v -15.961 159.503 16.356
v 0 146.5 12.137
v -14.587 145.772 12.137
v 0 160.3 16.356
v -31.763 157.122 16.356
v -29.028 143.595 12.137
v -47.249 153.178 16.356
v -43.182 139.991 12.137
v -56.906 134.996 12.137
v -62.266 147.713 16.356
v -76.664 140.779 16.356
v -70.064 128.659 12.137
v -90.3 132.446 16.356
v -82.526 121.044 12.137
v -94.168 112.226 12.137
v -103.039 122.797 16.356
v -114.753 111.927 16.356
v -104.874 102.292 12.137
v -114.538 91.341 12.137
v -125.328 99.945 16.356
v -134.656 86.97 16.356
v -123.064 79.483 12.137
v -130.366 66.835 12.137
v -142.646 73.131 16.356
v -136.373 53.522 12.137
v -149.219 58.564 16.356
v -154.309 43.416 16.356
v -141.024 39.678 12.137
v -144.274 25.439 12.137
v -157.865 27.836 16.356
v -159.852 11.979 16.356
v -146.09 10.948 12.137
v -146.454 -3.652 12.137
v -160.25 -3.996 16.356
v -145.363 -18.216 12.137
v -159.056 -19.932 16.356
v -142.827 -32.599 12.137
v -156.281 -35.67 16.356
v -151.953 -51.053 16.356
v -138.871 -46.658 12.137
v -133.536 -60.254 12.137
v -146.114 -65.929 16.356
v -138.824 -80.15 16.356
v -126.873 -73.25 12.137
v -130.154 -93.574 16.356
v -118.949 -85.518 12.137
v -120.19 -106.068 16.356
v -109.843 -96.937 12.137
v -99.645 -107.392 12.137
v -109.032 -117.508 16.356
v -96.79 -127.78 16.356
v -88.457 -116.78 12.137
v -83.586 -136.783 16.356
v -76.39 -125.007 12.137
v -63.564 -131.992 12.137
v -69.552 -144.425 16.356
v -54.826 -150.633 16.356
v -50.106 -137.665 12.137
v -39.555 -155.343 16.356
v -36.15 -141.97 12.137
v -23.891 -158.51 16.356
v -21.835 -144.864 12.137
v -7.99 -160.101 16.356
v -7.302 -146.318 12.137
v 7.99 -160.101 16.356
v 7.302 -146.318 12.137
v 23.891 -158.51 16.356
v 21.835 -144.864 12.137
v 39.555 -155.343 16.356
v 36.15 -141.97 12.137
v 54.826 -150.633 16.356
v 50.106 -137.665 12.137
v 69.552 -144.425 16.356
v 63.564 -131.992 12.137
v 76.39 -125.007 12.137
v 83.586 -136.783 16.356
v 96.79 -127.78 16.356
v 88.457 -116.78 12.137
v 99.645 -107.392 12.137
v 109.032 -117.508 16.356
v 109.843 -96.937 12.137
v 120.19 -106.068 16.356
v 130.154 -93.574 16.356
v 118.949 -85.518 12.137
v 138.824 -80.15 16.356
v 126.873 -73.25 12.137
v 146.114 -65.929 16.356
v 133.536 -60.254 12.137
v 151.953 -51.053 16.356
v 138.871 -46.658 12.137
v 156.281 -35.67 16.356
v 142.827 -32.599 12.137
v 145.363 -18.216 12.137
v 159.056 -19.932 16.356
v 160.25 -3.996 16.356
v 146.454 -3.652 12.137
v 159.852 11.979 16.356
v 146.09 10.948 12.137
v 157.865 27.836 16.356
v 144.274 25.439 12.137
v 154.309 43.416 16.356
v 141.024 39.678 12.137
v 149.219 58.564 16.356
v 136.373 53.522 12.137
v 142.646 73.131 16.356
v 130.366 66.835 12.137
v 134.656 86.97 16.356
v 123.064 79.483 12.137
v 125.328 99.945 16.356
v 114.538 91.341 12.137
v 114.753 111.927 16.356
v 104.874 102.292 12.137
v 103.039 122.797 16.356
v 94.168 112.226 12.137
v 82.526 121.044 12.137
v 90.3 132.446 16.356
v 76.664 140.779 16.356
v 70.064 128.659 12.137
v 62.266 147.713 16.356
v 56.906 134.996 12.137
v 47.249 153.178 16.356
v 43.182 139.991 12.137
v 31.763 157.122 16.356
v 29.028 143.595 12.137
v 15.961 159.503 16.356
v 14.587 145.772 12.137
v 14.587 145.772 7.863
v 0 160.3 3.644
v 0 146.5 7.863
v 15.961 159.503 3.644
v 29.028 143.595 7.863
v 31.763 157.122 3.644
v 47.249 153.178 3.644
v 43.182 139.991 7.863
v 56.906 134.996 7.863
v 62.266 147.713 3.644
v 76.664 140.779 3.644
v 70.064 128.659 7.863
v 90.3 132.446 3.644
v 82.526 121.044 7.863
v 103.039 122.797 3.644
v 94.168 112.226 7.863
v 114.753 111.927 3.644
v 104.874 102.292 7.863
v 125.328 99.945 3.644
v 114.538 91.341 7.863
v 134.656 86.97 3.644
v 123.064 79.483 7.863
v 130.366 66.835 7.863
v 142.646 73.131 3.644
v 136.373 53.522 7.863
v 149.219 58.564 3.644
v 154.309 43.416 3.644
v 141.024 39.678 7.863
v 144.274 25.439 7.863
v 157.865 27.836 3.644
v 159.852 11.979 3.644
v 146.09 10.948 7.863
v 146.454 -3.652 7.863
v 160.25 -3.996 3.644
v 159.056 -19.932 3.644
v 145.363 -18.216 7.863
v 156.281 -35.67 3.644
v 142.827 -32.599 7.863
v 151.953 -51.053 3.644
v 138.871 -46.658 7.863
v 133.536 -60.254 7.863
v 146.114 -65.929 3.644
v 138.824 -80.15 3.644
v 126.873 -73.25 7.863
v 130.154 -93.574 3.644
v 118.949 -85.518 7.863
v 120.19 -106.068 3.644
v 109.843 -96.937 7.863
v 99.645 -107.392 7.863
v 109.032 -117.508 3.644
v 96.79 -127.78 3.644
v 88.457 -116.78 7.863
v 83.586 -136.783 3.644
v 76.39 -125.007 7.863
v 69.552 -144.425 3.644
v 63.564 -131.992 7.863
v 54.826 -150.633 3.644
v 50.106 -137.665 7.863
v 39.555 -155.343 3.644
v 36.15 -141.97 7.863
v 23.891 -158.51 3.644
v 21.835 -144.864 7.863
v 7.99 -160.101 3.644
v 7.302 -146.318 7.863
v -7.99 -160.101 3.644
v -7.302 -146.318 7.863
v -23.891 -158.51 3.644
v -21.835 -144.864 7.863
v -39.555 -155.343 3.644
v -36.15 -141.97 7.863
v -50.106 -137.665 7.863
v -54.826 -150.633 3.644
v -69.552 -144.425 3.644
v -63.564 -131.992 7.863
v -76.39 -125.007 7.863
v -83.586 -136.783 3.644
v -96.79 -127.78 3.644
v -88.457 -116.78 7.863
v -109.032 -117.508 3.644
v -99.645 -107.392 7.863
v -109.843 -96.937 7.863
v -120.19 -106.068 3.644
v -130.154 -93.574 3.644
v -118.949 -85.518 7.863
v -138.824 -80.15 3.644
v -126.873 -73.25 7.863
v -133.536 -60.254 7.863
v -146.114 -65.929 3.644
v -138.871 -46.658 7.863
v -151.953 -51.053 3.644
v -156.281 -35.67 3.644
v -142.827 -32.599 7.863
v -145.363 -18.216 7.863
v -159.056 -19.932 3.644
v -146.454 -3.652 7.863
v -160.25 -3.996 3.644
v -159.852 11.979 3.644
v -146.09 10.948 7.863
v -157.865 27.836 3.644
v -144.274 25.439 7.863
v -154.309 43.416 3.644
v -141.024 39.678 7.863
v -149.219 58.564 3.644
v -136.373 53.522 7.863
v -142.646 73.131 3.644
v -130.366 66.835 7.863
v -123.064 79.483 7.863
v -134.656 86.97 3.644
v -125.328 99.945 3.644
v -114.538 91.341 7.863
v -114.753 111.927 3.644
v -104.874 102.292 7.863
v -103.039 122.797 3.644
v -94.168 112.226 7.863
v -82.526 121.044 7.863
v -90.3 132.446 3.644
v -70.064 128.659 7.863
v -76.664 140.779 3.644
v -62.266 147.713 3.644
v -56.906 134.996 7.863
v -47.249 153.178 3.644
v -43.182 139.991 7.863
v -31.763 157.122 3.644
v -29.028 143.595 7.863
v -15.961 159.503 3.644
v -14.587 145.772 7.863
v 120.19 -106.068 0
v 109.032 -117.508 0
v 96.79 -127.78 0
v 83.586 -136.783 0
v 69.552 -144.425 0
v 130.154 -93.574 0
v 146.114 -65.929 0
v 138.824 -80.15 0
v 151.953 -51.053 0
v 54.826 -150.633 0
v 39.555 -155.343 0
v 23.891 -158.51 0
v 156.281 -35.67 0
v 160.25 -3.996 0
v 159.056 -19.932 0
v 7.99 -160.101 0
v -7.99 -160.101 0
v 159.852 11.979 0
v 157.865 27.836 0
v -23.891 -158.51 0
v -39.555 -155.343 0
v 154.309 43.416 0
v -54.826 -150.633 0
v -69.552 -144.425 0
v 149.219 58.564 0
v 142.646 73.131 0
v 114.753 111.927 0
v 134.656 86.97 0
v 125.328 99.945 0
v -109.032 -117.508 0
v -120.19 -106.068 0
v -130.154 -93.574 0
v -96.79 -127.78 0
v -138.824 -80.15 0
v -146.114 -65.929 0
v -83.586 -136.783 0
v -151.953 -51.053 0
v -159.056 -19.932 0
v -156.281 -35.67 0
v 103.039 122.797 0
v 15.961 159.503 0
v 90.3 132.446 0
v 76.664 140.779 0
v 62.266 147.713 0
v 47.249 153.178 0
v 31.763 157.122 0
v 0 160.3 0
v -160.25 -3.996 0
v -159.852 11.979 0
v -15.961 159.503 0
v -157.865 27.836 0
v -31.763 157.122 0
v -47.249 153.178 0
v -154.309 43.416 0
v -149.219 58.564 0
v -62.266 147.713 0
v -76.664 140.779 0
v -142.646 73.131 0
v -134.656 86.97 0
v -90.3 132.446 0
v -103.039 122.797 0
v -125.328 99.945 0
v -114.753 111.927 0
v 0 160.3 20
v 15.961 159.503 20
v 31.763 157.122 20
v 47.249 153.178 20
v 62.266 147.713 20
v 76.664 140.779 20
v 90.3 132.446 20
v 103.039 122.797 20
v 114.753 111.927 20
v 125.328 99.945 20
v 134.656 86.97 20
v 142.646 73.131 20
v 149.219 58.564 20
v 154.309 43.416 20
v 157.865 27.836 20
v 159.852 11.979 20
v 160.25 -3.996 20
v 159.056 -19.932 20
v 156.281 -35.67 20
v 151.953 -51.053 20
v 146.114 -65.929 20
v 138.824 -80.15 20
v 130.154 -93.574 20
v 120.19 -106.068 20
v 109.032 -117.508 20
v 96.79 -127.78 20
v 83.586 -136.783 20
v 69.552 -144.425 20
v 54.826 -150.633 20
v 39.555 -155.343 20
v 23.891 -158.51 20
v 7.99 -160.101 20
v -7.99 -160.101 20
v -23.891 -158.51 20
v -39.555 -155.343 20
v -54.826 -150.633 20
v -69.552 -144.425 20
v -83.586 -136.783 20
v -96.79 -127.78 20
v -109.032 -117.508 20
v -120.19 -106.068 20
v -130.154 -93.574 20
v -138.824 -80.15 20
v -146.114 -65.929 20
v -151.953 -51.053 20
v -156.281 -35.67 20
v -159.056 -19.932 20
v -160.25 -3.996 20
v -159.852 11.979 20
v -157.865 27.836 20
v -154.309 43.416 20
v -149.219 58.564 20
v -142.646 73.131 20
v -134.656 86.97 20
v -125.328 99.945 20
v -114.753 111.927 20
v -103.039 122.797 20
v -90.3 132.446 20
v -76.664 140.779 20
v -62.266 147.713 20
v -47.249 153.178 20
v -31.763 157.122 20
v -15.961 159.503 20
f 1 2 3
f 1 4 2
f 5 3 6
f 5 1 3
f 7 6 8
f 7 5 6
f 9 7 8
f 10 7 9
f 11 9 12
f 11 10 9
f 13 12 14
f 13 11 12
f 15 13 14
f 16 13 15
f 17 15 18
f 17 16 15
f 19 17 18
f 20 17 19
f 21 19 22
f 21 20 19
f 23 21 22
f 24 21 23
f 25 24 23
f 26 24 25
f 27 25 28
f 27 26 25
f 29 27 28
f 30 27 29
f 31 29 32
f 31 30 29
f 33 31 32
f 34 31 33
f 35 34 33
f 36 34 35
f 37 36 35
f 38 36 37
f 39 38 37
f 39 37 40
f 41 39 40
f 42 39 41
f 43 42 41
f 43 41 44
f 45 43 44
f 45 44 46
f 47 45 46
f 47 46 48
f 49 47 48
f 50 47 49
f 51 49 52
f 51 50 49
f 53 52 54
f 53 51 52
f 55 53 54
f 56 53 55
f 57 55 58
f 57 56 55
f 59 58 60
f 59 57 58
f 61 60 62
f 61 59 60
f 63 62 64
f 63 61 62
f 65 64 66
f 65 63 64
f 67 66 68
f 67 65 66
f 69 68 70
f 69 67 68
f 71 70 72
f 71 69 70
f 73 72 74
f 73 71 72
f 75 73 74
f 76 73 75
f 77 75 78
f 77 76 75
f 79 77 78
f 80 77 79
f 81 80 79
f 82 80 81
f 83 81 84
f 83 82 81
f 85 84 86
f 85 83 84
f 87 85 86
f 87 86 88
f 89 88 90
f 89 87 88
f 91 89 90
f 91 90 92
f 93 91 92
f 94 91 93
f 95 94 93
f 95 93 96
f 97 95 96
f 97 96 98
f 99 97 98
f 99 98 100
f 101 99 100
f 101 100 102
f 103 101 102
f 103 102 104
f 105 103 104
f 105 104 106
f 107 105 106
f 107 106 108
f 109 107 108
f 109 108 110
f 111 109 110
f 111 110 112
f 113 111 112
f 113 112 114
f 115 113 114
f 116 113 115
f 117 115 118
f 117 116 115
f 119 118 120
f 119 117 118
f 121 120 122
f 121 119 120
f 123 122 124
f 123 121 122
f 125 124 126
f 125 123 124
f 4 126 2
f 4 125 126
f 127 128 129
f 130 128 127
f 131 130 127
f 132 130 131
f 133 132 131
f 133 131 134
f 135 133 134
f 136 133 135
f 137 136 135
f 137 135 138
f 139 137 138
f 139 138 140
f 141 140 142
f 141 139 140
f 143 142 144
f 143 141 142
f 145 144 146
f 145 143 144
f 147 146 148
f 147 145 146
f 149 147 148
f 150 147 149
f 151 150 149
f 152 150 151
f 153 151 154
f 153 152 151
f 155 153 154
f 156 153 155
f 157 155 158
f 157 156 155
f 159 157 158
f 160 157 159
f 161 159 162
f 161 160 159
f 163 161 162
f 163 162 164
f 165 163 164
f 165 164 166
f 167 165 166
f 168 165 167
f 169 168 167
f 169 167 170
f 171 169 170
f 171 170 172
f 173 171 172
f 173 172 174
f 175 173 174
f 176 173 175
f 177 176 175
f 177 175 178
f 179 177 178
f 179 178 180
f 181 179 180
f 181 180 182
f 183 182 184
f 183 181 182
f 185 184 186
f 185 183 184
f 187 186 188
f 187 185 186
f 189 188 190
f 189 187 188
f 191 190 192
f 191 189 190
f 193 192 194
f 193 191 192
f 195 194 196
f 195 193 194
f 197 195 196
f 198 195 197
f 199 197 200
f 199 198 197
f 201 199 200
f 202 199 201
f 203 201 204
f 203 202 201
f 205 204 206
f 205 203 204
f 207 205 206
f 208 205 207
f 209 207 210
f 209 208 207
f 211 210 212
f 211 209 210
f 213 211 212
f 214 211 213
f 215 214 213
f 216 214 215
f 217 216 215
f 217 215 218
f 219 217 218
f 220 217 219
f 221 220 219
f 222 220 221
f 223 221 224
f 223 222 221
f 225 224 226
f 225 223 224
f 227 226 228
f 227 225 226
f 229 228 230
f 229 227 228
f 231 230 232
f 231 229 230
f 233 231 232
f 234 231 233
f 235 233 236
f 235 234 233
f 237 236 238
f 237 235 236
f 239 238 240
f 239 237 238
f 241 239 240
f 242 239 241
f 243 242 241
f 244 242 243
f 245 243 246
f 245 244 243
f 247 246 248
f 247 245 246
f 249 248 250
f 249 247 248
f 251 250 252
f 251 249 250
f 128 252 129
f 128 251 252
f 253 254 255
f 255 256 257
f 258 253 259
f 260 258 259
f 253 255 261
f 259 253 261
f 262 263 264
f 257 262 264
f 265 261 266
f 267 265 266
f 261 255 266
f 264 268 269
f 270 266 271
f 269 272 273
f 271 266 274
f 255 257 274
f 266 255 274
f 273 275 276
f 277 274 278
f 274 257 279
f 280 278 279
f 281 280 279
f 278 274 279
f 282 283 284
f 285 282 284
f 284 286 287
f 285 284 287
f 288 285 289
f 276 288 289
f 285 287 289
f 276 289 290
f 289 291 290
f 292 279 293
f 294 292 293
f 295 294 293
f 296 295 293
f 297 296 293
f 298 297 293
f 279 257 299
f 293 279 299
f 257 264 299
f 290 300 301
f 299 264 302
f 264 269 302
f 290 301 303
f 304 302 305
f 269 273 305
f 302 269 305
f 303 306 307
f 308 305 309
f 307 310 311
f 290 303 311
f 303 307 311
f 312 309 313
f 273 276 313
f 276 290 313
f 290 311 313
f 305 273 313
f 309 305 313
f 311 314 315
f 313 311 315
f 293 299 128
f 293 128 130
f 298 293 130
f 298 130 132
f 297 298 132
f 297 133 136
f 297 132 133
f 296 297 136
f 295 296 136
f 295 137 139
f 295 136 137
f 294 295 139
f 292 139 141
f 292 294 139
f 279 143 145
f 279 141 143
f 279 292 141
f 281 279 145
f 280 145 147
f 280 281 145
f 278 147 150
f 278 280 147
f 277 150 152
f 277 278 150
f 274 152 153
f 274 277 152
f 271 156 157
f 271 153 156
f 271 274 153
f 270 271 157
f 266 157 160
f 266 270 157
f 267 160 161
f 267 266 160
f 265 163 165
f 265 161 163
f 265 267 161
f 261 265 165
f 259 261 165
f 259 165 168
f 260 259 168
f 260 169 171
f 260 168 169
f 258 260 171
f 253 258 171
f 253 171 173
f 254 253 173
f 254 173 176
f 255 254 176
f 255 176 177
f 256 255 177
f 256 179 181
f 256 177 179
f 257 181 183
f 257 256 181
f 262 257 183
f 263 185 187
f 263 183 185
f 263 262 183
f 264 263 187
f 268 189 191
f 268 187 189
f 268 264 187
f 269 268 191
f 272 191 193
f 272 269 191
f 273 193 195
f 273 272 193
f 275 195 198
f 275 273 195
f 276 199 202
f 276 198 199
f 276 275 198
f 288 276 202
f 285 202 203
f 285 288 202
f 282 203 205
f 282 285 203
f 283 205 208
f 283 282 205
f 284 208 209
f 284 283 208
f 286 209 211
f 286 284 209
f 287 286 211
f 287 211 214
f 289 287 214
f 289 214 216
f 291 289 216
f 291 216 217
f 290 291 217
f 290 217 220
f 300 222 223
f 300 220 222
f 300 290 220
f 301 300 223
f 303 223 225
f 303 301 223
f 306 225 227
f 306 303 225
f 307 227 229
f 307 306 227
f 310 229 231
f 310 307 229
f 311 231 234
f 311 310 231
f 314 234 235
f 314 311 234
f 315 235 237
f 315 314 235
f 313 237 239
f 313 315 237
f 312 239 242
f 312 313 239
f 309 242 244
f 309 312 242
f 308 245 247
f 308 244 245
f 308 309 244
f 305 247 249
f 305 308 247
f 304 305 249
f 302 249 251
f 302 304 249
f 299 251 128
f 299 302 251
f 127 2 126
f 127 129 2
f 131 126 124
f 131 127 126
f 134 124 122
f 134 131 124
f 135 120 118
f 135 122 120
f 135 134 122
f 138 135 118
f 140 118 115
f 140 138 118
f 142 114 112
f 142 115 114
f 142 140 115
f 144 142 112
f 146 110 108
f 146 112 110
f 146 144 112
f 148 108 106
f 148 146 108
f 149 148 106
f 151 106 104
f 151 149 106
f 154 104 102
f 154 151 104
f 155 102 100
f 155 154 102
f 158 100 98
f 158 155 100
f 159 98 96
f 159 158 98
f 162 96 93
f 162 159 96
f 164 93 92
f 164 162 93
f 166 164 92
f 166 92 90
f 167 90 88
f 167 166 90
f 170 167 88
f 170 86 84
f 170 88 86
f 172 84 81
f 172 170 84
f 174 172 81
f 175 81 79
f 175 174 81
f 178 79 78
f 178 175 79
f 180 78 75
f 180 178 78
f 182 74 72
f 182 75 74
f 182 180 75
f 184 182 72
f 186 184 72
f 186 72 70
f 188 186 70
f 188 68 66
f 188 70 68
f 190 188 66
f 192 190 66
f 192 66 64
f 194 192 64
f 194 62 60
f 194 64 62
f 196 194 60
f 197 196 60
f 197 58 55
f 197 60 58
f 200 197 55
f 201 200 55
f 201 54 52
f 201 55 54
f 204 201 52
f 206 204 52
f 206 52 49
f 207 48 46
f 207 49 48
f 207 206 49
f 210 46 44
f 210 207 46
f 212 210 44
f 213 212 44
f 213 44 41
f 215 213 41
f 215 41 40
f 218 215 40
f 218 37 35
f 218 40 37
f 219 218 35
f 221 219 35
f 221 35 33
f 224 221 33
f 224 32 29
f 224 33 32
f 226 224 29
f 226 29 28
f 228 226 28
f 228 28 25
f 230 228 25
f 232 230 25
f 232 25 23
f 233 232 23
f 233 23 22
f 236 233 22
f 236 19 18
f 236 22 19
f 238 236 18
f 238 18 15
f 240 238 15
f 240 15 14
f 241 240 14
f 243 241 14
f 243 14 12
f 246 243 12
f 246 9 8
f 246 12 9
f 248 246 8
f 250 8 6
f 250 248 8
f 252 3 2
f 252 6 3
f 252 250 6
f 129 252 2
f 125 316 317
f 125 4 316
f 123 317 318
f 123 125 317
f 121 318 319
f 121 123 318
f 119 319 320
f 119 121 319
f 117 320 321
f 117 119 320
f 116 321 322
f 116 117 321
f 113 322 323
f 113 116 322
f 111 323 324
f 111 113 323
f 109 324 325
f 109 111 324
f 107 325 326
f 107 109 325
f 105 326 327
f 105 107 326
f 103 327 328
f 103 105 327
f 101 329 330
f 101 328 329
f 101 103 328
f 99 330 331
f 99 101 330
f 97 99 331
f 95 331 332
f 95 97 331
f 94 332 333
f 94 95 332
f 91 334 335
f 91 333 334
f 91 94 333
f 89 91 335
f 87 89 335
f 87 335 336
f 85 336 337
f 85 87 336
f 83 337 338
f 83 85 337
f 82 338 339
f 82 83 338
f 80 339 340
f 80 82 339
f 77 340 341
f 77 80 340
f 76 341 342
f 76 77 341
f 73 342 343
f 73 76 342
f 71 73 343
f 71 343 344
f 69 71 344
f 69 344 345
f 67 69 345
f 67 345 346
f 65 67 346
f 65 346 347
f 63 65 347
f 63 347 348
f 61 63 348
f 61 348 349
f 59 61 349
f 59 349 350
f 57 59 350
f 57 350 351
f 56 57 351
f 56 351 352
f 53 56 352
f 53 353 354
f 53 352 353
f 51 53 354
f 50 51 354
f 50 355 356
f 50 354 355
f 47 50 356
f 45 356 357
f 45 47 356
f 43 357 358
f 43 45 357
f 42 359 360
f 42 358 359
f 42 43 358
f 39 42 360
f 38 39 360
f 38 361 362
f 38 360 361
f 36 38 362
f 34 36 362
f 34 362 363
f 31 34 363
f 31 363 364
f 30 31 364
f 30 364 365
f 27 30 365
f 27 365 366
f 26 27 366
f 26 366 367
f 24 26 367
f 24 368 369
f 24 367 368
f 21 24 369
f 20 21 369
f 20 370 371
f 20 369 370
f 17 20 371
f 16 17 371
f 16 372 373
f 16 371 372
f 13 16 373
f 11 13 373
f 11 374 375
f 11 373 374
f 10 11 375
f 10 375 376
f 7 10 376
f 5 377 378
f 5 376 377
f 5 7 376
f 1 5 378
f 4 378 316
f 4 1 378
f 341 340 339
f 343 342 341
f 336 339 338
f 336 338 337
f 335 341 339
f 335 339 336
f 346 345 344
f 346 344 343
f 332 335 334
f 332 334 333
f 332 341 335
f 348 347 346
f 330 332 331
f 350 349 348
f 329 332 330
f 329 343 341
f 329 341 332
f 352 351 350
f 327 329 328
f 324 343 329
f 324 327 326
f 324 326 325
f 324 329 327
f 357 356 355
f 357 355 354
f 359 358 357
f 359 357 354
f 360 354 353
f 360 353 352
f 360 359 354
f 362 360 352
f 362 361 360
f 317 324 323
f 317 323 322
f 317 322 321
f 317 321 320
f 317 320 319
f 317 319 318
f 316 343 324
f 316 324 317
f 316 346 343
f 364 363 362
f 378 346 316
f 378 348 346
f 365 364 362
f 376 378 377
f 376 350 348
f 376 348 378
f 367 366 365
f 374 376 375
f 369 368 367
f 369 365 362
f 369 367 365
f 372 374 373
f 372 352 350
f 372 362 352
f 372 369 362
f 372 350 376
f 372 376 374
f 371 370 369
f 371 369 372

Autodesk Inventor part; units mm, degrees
ref_plane "YZ Plane" through (0, 0, 0) normal (1, 0, 0) x (0, 1, 0)
ref_plane "XZ Plane" through (0, 0, 0) normal (0, 1, 0) x (-1, 0, 0)
sketch "Boceto principal" plane through (0, 0, 0) normal (1, 0, 0) x (0, 1, 0)
  line L0 (0, 20) -> (160.3, 20)
  line L1 (160.3, 20) -> (160.3, 16.356)
  line L2 (160.3, 16.356) -> (146.5, 12.137)
  line L3 (146.5, 12.137) -> (146.5, 7.863)
  line L4 (146.5, 7.863) -> (160.3, 3.644)
  line L5 (160.3, 3.644) -> (160.3, 0)
  line L6 (160.3, 0) -> (0, 0)
  line L7 (157.5, 15.5) -> (157.5, 4.5) construction
  line L8 (146.5, 10) -> (157.5, 10) construction
  line L9 (160.3, 16.356) -> (160.3, 3.644)
  line L10 (0, -4) -> (0, 24) projected
  line L11 (0, 0) -> (0, 20)
  dimension "d0" = 11
  dimension "d1" = 34
  dimension "d2" = 2.8
  dimension "d6" = 20
  dimension "d21" = 315
  dimension "d25" = 13.8
  dimension "d27" = 10
ref_plane "Plano de correa" through (0, 146.5, 10) normal (0, 0, 1) x (1, 0, 0)
revolve "Cuerpo" add sketch "Boceto principal" angle 360 about axis through (0, 0, -10) along (0, 0, 1)
revolve "Para ranuras" cut sketch "Boceto principal" angle 360 about axis through (0, 0, -10) along (0, 0, 1) contours L9 L4 L3 L2
fillet "Empalme externo" [suppressed]
fillet "Empalme interno" [suppressed]
pattern_of_one "Patrón para ranuras"
equation "\"d0\" = da_Bw"
equation "\"d1\" = da_Alfa"
equation "\"d2\" = da_c"
equation "\"d21\" = da_Dw"
equation "\"d25\" = da_Hd"
equation "\"d27\" = da_Se"
equation "\"da_r1\" = 0"
equation "\"da_r2\" = 0"
equation "\"d18\" = da_Sg"
equation "\"da_Bw\" = 11"
equation "\"da_Alfa\" = 34deg"
equation "\"da_c\" = 2.8"
equation "\"da_Dw\" = 315"
equation "\"da_Hd\" = 13.8"
equation "\"da_Se\" = 10"
equation "\"da_Sg\" = 15"
properties part number "Polea ranurada2" material "Steel"
